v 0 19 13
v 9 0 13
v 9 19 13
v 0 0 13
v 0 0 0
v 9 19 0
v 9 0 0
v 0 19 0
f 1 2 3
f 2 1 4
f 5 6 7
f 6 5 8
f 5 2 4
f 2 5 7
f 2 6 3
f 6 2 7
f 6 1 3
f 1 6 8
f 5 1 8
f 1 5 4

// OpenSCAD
// Generated by SolidPython 1.0.1 on 2020-07-29 00:46:55


cube(size = [9, 19, 13]);
/***********************************************
*********      SolidPython code:      **********
************************************************
 
# import packages: SolidPython
from solid import *
from solid.utils import *
from itertools import chain, combinations, permutations


class Resize:

    def __init__(self, scad_file):
        self.scad_file = scad_file
        #self.scad_file = import_scad(scad_file)
        # cone/cylinder param:
        self.r1 = 0
        self.r2 = 0
        self.h = 0
        # rectangular prism param:
        self.w = 0
        self.l = 0
        # ellipse param:
        self.r = 0

    # import OpenScad code (file name corresponds to shape)


    # classify shape + parameters
    def assign(self, param1, param2, param3):
        if self.scad_file == 'cone.scad':
            self.r1 = param1
            self.r2 = param2
            self.h = param3
        elif self.scad_file == 'cylinder.scad':
            self.r1 = param1
            self.r2 = param2
            self.h = param3
        elif self.scad_file == 'rectangularPrism.scad':
            self.h = param1
            self.l = param2
            self.w = param3
        else:
            self.r = param1
            self.h = param2

    # resize parameters
    def iterate(self):
        x = range(3, 20, 2)
        i = 1
        if self.scad_file == 'cone.scad':
            tempList = list(permutations(x, 2))
            for temp in tempList:
                param1 = temp[0]
                param2 = temp[1]
                filepath = 'produced_scad_files/' + 'cone' + str(param1) + '_' + str(param2) + '_' + '.scad'
                scad_render_to_file(cylinder(h=param1, r1=param2, r2=0), filepath)

        elif self.scad_file == 'cylinder.scad':
            tempList = list(permutations(x, 3))
            for temp in tempList:
                param1 = temp[0]
                param2 = temp[1]
                filepath = 'produced_scad_files/' + 'cylinder' + str(param1) + '_' + str(param2) + '_' + '.scad'
                scad_render_to_file(cylinder(h=param1, r1=param2, r2=param2), filepath)

        elif self.scad_file == 'rectangularPrism.scad':
            tempList = list(permutations(x, 3))
            for temp in tempList:
                param1 = temp[0]
                param2 = temp[1]
                param3 = temp[2]
                filepath = 'produced_scad_files/' + 'rectangularPrism' + str(param1) + '_' + str(param2) + '_' + str(
                    param3) + '.scad'
                scad_render_to_file(cube(size=(param1, param2, param3)), filepath)

        elif self.scad_file == 'ellipse.scad':
            tempList = list(permutations(x, 4))
            for temp in tempList:
                param1 = temp[0]
                param2 = temp[1]
                param3 = temp[2]
                param4 = temp[3]
                filepath = 'produced_scad_files/' + 'ellipse' + str(param1) + '_' + str(param2) + '_' + str(param3) + '_' + str(param4) + '.scad'
                scad_render_to_file(scale([param1, param2, param3])(sphere(r=param4)), filepath)

    def render_to_scadfile(self):
        scad_render_to_file(scad, 'example.scad') 
 
************************************************/
